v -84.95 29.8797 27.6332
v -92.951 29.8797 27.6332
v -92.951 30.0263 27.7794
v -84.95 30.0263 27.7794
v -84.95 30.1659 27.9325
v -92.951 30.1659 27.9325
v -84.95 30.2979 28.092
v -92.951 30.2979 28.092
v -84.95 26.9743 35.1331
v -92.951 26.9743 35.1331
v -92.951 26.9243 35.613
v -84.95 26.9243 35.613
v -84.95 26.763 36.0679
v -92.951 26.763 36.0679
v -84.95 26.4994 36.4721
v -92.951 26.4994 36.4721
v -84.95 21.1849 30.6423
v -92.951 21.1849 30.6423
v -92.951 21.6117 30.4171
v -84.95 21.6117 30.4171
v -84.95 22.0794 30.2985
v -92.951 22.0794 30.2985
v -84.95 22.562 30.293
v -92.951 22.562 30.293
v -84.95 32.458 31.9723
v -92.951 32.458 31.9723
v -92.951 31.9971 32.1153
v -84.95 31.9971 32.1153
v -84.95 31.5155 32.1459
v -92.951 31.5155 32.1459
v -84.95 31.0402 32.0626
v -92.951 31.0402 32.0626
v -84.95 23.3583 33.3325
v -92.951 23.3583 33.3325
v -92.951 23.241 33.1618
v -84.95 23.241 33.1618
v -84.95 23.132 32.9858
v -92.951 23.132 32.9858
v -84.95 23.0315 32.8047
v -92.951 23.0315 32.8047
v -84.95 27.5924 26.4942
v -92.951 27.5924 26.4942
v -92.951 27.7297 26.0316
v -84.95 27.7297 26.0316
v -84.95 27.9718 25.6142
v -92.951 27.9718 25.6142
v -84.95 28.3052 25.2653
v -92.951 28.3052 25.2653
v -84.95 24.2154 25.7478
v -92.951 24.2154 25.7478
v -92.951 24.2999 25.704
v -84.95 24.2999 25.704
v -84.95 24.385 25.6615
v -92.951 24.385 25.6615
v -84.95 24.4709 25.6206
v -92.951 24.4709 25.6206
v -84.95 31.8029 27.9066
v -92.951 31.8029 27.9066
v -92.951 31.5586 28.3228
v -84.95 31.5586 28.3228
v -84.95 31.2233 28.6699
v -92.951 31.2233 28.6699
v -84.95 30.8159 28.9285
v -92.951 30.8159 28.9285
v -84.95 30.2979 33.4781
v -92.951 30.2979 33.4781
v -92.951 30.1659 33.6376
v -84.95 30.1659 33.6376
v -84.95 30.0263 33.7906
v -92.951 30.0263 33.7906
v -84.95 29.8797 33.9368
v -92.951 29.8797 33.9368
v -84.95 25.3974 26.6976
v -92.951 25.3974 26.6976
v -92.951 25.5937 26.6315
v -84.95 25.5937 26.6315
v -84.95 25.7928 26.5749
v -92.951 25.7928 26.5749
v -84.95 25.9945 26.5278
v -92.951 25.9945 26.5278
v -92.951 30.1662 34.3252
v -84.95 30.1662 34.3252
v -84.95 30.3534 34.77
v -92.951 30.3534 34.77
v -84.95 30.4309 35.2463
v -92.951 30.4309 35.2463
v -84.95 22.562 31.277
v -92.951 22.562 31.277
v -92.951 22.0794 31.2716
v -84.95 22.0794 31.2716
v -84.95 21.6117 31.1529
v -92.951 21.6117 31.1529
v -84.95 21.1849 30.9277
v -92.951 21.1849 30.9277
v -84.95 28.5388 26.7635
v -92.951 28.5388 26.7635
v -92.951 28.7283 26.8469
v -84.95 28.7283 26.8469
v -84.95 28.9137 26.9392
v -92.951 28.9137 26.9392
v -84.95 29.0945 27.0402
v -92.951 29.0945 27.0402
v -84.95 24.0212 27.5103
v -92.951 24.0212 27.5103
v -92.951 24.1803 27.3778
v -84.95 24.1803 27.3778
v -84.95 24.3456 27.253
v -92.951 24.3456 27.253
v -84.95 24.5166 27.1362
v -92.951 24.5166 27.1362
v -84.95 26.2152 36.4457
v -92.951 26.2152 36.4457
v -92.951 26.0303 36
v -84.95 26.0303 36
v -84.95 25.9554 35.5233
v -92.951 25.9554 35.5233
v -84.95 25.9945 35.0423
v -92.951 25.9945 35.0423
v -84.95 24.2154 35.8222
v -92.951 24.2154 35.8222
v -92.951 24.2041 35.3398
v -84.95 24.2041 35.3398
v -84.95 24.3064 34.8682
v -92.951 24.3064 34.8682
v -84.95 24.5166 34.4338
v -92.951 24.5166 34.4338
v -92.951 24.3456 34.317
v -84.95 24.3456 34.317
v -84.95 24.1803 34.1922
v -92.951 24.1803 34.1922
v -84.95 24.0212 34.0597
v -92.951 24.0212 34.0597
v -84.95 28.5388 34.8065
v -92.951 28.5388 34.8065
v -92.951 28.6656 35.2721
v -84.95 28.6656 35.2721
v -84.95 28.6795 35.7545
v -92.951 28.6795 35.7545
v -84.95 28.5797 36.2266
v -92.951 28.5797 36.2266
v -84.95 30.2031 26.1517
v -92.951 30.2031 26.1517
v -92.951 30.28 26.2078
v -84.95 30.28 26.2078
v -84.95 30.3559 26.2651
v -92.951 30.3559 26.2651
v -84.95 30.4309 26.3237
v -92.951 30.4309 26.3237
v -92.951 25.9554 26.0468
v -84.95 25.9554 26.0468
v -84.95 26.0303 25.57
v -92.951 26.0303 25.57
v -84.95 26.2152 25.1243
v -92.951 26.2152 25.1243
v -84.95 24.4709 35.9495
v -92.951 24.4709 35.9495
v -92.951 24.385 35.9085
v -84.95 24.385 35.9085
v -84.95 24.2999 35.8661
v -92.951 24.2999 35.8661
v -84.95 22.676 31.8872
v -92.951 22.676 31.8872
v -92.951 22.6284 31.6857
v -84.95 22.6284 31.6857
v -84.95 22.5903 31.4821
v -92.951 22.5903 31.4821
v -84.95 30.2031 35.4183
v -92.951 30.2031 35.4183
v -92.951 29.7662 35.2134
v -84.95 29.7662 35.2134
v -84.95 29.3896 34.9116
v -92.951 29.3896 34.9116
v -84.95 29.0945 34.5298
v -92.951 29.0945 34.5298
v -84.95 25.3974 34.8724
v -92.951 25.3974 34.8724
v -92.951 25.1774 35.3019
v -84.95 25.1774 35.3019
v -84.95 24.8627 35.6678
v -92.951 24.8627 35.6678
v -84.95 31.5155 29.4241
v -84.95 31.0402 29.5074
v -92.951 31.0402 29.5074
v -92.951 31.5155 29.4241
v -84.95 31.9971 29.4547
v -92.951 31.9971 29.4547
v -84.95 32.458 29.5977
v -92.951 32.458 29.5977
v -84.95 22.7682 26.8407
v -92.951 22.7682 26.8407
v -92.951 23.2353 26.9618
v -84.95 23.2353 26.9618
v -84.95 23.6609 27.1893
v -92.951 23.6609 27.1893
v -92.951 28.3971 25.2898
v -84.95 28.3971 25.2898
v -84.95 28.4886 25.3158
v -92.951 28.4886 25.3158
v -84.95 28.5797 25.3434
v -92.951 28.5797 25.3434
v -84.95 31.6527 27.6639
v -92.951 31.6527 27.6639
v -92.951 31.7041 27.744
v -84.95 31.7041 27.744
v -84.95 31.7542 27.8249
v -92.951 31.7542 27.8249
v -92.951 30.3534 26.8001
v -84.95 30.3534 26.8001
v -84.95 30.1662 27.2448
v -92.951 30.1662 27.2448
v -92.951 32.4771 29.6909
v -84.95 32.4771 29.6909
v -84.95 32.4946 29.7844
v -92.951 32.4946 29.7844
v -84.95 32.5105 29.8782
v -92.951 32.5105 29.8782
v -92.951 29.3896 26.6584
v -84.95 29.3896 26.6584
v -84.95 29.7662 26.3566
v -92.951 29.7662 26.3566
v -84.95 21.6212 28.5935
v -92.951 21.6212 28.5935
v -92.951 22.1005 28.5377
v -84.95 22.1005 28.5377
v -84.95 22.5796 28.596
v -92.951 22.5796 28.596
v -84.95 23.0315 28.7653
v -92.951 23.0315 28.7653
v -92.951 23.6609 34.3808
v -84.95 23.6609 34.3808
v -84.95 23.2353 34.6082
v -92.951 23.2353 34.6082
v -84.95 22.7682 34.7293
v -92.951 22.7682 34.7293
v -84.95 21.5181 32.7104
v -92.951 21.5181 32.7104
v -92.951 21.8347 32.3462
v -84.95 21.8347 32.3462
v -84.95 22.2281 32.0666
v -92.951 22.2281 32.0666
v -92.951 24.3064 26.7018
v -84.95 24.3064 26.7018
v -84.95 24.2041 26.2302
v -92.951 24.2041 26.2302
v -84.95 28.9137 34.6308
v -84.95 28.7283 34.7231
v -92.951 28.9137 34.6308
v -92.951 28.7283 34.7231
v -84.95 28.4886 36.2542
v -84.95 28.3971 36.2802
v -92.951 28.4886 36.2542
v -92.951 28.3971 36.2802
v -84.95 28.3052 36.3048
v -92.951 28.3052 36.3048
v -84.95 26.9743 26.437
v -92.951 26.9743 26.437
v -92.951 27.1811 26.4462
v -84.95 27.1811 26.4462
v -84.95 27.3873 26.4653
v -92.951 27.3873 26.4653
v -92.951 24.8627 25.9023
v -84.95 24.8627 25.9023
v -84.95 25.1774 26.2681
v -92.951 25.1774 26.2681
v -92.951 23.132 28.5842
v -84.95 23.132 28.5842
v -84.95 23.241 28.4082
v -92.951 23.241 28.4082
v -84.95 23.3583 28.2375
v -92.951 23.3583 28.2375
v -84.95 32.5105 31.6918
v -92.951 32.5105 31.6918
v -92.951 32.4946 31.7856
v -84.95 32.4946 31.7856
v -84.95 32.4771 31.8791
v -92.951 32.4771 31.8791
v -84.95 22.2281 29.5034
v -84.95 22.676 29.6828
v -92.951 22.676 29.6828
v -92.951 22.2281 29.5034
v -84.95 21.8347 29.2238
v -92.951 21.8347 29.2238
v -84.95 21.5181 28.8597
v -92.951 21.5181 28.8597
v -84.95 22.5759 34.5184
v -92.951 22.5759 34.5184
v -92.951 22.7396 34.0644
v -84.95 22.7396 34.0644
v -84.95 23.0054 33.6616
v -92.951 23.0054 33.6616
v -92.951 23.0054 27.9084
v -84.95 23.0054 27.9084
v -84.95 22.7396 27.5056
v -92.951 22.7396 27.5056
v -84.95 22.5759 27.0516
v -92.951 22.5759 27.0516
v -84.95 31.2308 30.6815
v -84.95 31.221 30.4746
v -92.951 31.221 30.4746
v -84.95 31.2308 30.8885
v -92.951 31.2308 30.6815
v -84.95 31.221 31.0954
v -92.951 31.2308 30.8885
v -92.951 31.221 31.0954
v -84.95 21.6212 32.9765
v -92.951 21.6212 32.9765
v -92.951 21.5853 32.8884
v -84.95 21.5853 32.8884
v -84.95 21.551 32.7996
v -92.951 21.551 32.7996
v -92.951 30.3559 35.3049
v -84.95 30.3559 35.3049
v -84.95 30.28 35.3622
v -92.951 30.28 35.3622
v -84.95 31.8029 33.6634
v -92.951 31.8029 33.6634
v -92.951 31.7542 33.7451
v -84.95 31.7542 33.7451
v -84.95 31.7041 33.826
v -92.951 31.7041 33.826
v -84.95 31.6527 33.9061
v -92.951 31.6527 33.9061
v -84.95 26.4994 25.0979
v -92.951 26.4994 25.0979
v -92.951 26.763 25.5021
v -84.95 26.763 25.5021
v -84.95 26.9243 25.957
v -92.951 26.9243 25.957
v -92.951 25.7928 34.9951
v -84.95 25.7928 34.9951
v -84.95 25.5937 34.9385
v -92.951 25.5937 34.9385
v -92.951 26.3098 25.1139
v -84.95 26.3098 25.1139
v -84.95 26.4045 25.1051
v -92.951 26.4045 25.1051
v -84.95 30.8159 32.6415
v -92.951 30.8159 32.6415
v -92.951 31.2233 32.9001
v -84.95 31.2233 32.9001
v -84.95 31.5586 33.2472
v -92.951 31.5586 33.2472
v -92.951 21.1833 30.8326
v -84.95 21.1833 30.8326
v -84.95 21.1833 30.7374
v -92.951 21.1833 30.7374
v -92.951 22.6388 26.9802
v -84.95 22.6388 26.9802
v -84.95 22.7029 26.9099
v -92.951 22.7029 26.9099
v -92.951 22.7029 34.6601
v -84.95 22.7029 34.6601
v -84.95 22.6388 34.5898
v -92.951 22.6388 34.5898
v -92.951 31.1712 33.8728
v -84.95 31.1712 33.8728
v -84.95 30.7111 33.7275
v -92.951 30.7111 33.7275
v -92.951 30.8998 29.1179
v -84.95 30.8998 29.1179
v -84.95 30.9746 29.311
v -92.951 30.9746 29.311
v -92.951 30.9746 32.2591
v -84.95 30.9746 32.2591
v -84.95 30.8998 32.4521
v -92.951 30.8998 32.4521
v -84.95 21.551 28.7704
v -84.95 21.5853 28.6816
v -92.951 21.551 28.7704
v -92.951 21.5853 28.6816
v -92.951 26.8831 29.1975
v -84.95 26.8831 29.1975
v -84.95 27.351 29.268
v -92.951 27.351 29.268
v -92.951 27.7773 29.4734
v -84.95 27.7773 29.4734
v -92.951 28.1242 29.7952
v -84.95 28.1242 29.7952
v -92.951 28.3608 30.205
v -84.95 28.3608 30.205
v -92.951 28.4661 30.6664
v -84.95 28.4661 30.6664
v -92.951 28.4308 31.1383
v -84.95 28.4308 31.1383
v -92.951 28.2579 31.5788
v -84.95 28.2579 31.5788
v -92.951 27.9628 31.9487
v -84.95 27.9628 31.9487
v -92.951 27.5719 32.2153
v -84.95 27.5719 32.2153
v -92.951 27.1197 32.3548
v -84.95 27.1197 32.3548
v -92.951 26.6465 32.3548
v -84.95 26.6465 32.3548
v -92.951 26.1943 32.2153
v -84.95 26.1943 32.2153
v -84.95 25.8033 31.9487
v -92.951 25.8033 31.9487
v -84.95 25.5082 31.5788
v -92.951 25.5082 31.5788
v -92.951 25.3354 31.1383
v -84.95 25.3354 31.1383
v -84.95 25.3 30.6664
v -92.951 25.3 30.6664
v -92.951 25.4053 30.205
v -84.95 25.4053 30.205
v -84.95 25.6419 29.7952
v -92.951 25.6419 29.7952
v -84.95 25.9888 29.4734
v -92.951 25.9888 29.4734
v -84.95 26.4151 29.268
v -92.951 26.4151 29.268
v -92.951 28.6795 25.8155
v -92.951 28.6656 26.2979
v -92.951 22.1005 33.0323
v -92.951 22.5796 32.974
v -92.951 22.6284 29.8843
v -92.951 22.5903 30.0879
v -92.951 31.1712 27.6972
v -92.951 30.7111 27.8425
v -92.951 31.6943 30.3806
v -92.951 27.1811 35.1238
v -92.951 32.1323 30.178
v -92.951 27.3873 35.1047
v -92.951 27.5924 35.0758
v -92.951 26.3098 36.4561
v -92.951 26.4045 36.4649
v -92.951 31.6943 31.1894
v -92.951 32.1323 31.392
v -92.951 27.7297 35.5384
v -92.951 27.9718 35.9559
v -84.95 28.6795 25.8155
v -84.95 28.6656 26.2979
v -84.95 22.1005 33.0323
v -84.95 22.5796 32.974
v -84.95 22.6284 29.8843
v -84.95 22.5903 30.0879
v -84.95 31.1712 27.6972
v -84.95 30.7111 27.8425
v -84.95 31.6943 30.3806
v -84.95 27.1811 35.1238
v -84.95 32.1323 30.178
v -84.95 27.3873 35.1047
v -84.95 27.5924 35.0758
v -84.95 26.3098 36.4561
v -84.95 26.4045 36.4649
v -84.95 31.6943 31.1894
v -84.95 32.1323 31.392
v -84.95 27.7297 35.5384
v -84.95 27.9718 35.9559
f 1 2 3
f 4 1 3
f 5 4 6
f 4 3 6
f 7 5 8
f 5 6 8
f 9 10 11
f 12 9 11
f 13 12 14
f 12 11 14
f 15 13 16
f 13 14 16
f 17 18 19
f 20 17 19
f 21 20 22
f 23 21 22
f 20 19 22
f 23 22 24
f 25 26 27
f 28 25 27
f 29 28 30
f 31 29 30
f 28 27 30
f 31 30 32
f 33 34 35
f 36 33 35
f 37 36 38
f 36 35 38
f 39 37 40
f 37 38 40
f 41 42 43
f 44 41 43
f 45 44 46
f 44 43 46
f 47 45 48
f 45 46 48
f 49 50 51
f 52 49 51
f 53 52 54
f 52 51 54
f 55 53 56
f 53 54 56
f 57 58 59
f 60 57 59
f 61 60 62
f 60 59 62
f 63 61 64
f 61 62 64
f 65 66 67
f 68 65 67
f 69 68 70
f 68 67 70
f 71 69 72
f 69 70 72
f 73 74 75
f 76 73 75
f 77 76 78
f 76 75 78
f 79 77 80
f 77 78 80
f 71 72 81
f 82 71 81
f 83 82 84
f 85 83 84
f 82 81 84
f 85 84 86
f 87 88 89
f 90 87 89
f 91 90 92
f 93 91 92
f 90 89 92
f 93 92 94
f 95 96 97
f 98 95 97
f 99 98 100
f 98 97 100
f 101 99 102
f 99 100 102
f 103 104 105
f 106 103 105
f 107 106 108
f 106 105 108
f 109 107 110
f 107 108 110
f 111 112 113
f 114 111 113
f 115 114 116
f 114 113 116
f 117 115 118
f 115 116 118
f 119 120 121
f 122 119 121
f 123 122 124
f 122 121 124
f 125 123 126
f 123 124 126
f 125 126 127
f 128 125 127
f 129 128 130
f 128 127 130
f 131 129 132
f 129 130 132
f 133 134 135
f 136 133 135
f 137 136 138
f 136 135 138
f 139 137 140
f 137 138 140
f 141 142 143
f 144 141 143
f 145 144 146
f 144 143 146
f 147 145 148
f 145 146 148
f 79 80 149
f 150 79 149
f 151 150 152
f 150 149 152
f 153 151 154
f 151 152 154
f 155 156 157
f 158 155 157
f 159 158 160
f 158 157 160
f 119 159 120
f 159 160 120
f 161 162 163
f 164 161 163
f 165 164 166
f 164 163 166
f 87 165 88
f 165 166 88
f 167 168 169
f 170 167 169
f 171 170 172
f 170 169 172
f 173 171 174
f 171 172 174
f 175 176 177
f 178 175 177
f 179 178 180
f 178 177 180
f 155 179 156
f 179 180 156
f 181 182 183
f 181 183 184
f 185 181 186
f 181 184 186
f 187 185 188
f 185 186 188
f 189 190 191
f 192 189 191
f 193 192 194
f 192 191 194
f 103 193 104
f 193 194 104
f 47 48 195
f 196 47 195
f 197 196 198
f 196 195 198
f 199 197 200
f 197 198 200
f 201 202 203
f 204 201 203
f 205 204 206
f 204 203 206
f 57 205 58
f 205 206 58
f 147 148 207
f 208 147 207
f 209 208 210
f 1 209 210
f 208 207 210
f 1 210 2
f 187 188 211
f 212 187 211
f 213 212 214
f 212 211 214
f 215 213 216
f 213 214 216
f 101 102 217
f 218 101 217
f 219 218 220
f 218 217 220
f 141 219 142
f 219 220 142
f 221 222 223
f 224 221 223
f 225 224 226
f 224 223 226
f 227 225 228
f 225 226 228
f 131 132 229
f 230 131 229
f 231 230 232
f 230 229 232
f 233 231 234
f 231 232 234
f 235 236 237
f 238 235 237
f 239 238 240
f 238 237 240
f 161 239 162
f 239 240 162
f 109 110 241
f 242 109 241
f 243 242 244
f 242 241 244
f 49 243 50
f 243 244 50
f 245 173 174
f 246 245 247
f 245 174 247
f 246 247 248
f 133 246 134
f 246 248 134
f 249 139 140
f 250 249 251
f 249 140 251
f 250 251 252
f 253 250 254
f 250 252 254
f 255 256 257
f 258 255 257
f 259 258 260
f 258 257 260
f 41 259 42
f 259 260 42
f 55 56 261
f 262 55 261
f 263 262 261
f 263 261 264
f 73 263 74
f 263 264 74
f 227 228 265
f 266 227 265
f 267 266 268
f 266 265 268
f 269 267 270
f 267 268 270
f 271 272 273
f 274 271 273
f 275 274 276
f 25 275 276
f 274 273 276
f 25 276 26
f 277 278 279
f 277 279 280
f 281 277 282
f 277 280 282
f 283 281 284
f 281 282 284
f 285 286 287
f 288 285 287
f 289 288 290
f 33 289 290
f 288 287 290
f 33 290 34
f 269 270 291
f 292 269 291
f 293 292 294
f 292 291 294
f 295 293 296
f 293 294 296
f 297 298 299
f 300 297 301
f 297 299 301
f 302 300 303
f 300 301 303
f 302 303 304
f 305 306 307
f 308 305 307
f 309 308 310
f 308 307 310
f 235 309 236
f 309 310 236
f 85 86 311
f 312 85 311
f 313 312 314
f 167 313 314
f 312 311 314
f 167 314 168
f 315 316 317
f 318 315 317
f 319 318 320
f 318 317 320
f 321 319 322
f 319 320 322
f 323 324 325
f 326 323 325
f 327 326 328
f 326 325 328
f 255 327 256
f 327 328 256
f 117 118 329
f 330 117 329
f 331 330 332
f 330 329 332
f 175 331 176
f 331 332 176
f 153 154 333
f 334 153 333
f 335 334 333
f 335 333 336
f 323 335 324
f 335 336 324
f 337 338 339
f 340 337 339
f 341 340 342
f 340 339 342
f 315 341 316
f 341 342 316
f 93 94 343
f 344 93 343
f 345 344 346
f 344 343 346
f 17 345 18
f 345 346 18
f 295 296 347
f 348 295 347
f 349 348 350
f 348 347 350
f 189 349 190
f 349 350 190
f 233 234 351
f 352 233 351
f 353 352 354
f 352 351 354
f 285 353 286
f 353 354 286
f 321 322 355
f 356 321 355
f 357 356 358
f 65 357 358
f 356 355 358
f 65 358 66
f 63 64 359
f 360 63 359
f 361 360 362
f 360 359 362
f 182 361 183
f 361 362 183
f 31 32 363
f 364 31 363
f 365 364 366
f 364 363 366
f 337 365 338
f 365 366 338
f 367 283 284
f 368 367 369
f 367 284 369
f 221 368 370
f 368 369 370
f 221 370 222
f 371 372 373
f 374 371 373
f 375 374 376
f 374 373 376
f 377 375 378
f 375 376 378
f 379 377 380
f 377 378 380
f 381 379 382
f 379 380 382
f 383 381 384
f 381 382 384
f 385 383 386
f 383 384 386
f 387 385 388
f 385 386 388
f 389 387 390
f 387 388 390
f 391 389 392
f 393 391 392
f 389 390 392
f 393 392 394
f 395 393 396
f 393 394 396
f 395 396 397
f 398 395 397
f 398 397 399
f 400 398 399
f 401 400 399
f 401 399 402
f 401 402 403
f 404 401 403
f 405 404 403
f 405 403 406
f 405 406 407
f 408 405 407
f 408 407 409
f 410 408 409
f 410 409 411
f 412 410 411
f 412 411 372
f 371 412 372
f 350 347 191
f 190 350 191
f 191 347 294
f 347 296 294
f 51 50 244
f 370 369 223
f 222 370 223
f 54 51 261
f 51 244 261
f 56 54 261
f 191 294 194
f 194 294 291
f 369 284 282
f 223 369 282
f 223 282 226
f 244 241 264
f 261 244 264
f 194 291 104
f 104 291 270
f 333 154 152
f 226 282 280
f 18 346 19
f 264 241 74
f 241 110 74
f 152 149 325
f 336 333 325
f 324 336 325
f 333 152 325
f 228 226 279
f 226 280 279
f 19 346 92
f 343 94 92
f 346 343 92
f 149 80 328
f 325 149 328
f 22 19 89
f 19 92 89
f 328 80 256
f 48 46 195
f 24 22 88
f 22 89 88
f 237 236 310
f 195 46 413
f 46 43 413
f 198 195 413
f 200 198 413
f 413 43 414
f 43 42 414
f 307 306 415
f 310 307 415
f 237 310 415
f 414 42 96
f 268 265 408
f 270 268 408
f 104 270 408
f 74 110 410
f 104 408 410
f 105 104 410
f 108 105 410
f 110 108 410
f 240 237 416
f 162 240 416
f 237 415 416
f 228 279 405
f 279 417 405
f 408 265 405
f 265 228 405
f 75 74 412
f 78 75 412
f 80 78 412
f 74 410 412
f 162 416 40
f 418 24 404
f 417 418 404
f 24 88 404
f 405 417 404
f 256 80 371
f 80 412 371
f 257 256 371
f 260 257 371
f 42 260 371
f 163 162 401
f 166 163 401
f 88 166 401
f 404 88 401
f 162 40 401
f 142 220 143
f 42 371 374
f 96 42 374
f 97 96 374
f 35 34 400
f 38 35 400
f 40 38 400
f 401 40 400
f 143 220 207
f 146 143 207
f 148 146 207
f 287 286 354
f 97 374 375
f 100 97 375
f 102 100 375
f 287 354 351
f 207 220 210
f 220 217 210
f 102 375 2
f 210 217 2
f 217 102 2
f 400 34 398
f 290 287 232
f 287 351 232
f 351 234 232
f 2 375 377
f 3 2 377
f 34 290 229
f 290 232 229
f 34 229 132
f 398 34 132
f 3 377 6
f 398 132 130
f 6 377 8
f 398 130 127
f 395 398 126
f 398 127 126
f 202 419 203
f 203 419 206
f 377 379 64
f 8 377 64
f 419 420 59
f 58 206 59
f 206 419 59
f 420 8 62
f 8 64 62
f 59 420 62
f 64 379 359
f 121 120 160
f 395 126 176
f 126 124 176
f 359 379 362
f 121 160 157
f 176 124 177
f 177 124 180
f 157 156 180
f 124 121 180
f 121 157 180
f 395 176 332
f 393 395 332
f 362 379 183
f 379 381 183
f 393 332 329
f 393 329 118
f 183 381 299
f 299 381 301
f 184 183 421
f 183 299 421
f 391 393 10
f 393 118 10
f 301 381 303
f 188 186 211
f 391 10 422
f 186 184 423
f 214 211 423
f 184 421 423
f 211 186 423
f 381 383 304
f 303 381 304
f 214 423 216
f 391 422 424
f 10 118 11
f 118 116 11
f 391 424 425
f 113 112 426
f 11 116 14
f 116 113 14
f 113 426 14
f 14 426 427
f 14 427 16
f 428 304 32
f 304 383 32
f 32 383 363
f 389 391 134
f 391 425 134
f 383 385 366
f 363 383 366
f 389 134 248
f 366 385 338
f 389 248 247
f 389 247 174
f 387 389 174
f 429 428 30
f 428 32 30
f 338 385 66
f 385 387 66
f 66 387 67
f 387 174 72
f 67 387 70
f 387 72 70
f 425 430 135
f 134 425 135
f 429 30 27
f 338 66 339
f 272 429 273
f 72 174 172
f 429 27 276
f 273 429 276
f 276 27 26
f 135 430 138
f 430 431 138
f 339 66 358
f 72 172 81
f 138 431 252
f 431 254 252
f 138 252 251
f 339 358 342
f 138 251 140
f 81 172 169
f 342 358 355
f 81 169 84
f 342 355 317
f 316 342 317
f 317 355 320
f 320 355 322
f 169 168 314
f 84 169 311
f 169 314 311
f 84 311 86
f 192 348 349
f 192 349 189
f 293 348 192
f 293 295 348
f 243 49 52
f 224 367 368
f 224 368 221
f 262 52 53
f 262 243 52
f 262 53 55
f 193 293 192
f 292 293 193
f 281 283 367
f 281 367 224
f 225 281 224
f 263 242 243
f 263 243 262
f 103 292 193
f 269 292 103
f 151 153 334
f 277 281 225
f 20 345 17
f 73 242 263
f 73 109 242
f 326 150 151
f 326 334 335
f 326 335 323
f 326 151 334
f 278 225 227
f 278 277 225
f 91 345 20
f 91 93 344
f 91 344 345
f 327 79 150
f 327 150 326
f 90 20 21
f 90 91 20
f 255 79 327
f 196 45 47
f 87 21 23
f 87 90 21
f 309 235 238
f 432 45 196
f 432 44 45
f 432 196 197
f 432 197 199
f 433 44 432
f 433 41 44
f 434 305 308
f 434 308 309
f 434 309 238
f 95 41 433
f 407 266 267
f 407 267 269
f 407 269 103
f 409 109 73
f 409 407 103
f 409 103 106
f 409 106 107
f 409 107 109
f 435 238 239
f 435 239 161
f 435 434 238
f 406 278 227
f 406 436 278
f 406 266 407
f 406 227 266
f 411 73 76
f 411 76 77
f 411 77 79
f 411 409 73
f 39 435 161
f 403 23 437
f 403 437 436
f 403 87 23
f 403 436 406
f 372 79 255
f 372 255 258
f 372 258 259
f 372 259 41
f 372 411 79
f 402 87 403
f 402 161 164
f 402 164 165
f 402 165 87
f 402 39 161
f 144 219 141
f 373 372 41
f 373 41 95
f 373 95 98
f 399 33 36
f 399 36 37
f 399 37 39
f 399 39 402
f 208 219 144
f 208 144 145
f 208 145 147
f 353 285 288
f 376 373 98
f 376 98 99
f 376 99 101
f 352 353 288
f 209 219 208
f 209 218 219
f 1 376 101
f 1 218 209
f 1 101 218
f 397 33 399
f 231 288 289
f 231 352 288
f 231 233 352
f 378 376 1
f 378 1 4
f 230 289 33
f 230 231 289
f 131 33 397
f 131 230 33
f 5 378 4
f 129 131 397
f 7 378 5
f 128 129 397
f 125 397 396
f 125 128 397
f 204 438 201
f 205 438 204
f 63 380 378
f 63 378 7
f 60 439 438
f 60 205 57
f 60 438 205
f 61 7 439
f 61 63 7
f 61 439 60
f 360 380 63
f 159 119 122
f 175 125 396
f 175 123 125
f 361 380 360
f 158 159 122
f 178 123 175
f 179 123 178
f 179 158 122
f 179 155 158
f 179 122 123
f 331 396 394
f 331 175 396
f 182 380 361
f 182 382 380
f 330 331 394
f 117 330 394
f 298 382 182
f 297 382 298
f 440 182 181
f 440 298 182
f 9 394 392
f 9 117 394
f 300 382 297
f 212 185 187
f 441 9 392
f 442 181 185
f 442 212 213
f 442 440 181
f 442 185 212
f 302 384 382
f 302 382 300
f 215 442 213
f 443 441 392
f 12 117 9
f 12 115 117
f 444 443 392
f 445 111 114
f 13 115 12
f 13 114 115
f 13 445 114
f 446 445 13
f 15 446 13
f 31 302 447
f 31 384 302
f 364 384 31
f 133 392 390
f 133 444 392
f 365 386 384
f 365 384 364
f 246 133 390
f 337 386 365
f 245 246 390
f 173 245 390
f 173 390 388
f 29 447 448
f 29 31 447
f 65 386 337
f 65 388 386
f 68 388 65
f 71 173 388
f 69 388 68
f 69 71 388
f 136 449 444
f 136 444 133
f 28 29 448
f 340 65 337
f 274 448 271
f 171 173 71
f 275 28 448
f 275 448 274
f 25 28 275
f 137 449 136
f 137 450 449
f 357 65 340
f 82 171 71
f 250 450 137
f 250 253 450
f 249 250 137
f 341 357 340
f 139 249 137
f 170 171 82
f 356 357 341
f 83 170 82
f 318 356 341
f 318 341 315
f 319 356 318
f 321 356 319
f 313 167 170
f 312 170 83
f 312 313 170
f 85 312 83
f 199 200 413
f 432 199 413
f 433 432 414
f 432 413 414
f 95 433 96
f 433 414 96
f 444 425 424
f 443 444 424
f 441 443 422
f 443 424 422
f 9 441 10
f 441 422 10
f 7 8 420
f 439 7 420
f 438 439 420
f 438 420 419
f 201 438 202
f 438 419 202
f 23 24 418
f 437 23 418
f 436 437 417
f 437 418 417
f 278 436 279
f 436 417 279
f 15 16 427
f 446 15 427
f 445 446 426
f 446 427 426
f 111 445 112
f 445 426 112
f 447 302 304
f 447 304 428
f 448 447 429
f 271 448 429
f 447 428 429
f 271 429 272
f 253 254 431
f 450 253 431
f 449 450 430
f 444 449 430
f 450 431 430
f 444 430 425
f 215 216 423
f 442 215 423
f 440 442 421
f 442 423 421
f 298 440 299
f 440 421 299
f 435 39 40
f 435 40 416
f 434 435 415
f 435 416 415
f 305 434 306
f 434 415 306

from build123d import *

# Parameters (mm, degrees)
SPUR_START             = -92.950977625
SPUR_GEAR_AM_OUTLINE_R = 1.5
SPUR_GEAR_AM_DEPTH     = 8.001
SKETCH1_R              = 1.5875
CUT_EXTRUDE1_DEPTH     = 50.509189617


# Read off the part's stored shape, not the designer's step: spur gear_am
with BuildPart() as part:
    # spur gear_am outline → spur gear_am (new body)
    with BuildSketch(Plane.YZ.offset(SPUR_START)):
        with BuildLine():
            ThreePointArc((31.652652911, 27.663945588), (31.729301927, 27.784343625), (31.802912423, 27.906623033))
            ThreePointArc((31.802912423, 27.906623033), (31.401254023, 28.50628356), (30.815920965, 28.928548203))
            ThreePointArc((30.815920965, 28.928548203), (30.938385979, 29.213966947), (31.040168606, 29.50739809))
            ThreePointArc((31.040168606, 29.50739809), (31.757212806, 29.425119095), (32.45803063, 29.597678058))
            ThreePointArc((32.45803063, 29.597678058), (32.486010922, 29.737634702), (32.510478248, 29.878248033))
            ThreePointArc((32.510478248, 29.878248033), (31.919320576, 30.292319071), (31.220974171, 30.474622435))
            ThreePointArc((31.220974171, 30.474622435), (31.232064254, 30.785006953), (31.220974171, 31.095391471))
            ThreePointArc((31.220974171, 31.095391471), (31.919320576, 31.277694835), (32.510478248, 31.691765874))
            ThreePointArc((32.510478248, 31.691765874), (32.486010922, 31.832379205), (32.45803063, 31.972335848))
            ThreePointArc((32.45803063, 31.972335848), (31.757212806, 32.144894811), (31.040168606, 32.062615816))
            ThreePointArc((31.040168606, 32.062615816), (30.938385979, 32.356046959), (30.815920965, 32.641465703))
            ThreePointArc((30.815920965, 32.641465703), (31.401254023, 33.063730346), (31.802912423, 33.663390873))
            ThreePointArc((31.802912423, 33.663390873), (31.729301927, 33.785670282), (31.652652911, 33.906068318))
            ThreePointArc((31.652652911, 33.906068318), (30.936824265, 33.81381016), (30.297923062, 33.47806104))
            ThreePointArc((30.297923062, 33.47806104), (30.097014035, 33.714909307), (29.879713667, 33.936814893))
            ThreePointArc((29.879713667, 33.936814893), (30.272980906, 34.542011636), (30.430893842, 35.246274174))
            ThreePointArc((30.430893842, 35.246274174), (30.318081681, 35.333705149), (30.203115814, 35.418284156))
            ThreePointArc((30.203115814, 35.418284156), (29.568952972, 35.073668852), (29.094481914, 34.529794388))
            ThreePointArc((29.094481914, 34.529794388), (28.821580363, 34.678072107), (28.538792261, 34.806494957))
            ThreePointArc((28.538792261, 34.806494957), (28.68688076, 35.512888625), (28.579721215, 36.226638616))
            ThreePointArc((28.579721215, 36.226638616), (28.442943297, 36.267413119), (28.305187358, 36.304750233))
            ThreePointArc((28.305187358, 36.304750233), (27.838337524, 35.754319991), (27.592376558, 35.075773441))
            ThreePointArc((27.592376558, 35.075773441), (27.284339349, 35.115454886), (26.974255613, 35.133050782))
            ThreePointArc((26.974255613, 35.133050782), (26.8571652, 35.845238996), (26.499405664, 36.472080549))
            ThreePointArc((26.499405664, 36.472080549), (26.357134605, 36.460691758), (26.215193296, 36.445744395))
            ThreePointArc((26.215193296, 36.445744395), (25.978707128, 35.763837869), (25.994474644, 35.042260705))
            ThreePointArc((25.994474644, 35.042260705), (25.69290391, 34.967986675), (25.397403066, 34.872379194))
            ThreePointArc((25.397403066, 34.872379194), (25.030947451, 35.494176991), (24.470905332, 35.94945168))
            ThreePointArc((24.470905332, 35.94945168), (24.342355626, 35.887437714), (24.215398907, 35.822224598))
            ThreePointArc((24.215398907, 35.822224598), (24.241215173, 35.100937042), (24.51658168, 34.433782259))
            ThreePointArc((24.51658168, 34.433782259), (24.26220622, 34.255583875), (24.021197296, 34.059685336))
            ThreePointArc((24.021197296, 34.059685336), (23.454868339, 34.507115477), (22.768180428, 34.729335933))
            ThreePointArc((22.768180428, 34.729335933), (22.670713426, 34.625072122), (22.575887506, 34.518400646))
            ThreePointArc((22.575887506, 34.518400646), (22.860519576, 33.855145941), (23.358295302, 33.332516489))
            ThreePointArc((23.358295302, 33.332516489), (23.18546993, 33.074460429), (23.031502516, 32.804728017))
            ThreePointArc((23.031502516, 32.804728017), (22.341786081, 33.017362582), (21.621193386, 32.976516701))
            ThreePointArc((21.621193386, 32.976516701), (21.567972546, 32.84408445), (21.518084191, 32.710361188))
            ThreePointArc((21.518084191, 32.710361188), (22.023090926, 32.194715558), (22.676048502, 31.88719544))
            ThreePointArc((22.676048502, 31.88719544), (22.608114243, 31.584133606), (22.561982491, 31.276996177))
            ThreePointArc((22.561982491, 31.276996177), (21.842028605, 31.22611769), (21.184851162, 30.927721934))
            ThreePointArc((21.184851162, 30.927721934), (21.183064254, 30.785006953), (21.184851162, 30.642291972))
            ThreePointArc((21.184851162, 30.642291972), (21.842028605, 30.343896216), (22.561982491, 30.293017729))
            ThreePointArc((22.561982491, 30.293017729), (22.608114243, 29.9858803), (22.676048502, 29.682818466))
            ThreePointArc((22.676048502, 29.682818466), (22.023090926, 29.375298348), (21.518084191, 28.859652718))
            ThreePointArc((21.518084191, 28.859652718), (21.567972546, 28.725929456), (21.621193386, 28.593497205))
            ThreePointArc((21.621193386, 28.593497205), (22.341786081, 28.552651324), (23.031502516, 28.765285889))
            ThreePointArc((23.031502516, 28.765285889), (23.18546993, 28.495553477), (23.358295302, 28.237497417))
            ThreePointArc((23.358295302, 28.237497417), (22.860519576, 27.714867965), (22.575887506, 27.051613261))
            ThreePointArc((22.575887506, 27.051613261), (22.670713426, 26.944941784), (22.768180428, 26.840677973))
            ThreePointArc((22.768180428, 26.840677973), (23.454868339, 27.062898429), (24.021197296, 27.51032857))
            ThreePointArc((24.021197296, 27.51032857), (24.26220622, 27.314430032), (24.51658168, 27.136231648))
            ThreePointArc((24.51658168, 27.136231648), (24.241215173, 26.469076865), (24.215398907, 25.747789309))
            ThreePointArc((24.215398907, 25.747789309), (24.342355626, 25.682576192), (24.470905332, 25.620562226))
            ThreePointArc((24.470905332, 25.620562226), (25.030947451, 26.075836915), (25.397403066, 26.697634712))
            ThreePointArc((25.397403066, 26.697634712), (25.69290391, 26.602027231), (25.994474644, 26.527753202))
            ThreePointArc((25.994474644, 26.527753202), (25.978707128, 25.806176038), (26.215193296, 25.124269511))
            ThreePointArc((26.215193296, 25.124269511), (26.357134605, 25.109322148), (26.499405664, 25.097933357))
            ThreePointArc((26.499405664, 25.097933357), (26.8571652, 25.72477491), (26.974255613, 26.436963124))
            ThreePointArc((26.974255613, 26.436963124), (27.284339349, 26.45455902), (27.592376558, 26.494240465))
            ThreePointArc((27.592376558, 26.494240465), (27.838337524, 25.815693915), (28.305187358, 25.265263673))
            ThreePointArc((28.305187358, 25.265263673), (28.442943297, 25.302600787), (28.579721215, 25.34337529))
            ThreePointArc((28.579721215, 25.34337529), (28.68688076, 26.057125281), (28.538792261, 26.763518949))
            ThreePointArc((28.538792261, 26.763518949), (28.821580363, 26.891941799), (29.094481914, 27.040219519))
            ThreePointArc((29.094481914, 27.040219519), (29.568952972, 26.496345054), (30.203115814, 26.151729751))
            ThreePointArc((30.203115814, 26.151729751), (30.318081681, 26.236308758), (30.430893842, 26.323739732))
            ThreePointArc((30.430893842, 26.323739732), (30.272980906, 27.02800227), (29.879713667, 27.633199013))
            ThreePointArc((29.879713667, 27.633199013), (30.097014035, 27.855104599), (30.297923062, 28.091952866))
            ThreePointArc((30.297923062, 28.091952866), (30.936824265, 27.756203746), (31.652652911, 27.663945588))
        make_face()
        with Locations((26.883064254, 30.785006953)):
            Circle(SPUR_GEAR_AM_OUTLINE_R, mode=Mode.SUBTRACT)
    extrude(amount=SPUR_GEAR_AM_DEPTH)

    # Sketch1 → Cut-Extrude1 (cut, through all)
    with BuildSketch(Plane(origin=(-84.949977625, 0, 0), x_dir=(0, 0, -1), z_dir=(1, 0, 0))):
        with Locations((-30.785006953, 26.883064254)):
            Circle(SKETCH1_R)
    extrude(amount=-CUT_EXTRUDE1_DEPTH, mode=Mode.SUBTRACT)


solid = part.part
